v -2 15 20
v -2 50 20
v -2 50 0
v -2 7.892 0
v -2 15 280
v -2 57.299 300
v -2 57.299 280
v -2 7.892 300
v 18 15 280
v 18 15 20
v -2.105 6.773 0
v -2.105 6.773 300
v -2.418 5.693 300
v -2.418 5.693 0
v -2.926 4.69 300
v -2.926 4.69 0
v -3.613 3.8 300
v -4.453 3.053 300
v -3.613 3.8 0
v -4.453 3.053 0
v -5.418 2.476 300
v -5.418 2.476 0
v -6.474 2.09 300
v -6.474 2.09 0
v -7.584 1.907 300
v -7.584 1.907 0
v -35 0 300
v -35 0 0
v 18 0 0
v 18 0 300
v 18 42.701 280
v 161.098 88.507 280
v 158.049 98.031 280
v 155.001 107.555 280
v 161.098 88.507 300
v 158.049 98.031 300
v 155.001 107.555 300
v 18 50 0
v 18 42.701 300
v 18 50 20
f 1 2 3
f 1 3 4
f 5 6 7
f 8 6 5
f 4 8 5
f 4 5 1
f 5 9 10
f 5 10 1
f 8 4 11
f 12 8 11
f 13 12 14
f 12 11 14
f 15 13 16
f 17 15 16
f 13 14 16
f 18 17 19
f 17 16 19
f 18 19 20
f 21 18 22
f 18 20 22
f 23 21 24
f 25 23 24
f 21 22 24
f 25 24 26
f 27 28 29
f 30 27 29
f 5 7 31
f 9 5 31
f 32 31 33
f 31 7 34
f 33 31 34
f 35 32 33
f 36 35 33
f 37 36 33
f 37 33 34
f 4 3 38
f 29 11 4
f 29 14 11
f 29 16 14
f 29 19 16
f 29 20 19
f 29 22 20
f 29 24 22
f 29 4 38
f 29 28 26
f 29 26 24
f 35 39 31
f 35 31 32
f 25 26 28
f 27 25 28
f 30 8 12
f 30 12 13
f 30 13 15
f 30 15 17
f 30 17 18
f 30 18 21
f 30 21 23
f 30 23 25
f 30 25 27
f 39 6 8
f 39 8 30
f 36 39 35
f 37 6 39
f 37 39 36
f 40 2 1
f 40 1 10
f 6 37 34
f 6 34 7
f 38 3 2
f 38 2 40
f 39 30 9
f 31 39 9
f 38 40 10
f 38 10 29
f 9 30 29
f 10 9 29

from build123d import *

# Parameters (mm, degrees)
BOSS_EXTRU_2_DEPTH = 300
ESQUISSE7_W        = 20
ESQUISSE7_H        = 20
BOSS_EXTRU_5_DEPTH = 35
BOSS_EXTRU_6_DEPTH = 20


with BuildPart() as part:
    # Esquisse2 → Boss.-Extru.2 (new body)
    with BuildSketch(Plane.XY):
        Polygon((18, 15), (18, 0), (0, 0), (0, 5.028017638), (0, 15), align=None)
        with BuildLine():
            Line((-2, 15), (-2, 7.892441846))
            ThreePointArc((-2, 7.892441846), (-3.612637831, 3.799636794), (-7.583684398, 1.906902495))
            Line((-7.583684398, 1.906902495), (-35, 0))
            Line((-35, 0), (0, 0))
            Line((0, 0), (0, 5.028017638))
            Line((0, 5.028017638), (0, 15))
            Line((0, 15), (-2, 15))
        make_face()
    extrude(amount=BOSS_EXTRU_2_DEPTH)

    # Esquisse7 → Boss.-Extru.5 (add)
    with BuildSketch(Plane(origin=(0, 15, 0), x_dir=(1, 0, 0), z_dir=(0, 1, 0))):
        with Locations((8, -10)):
            Rectangle(ESQUISSE7_W, ESQUISSE7_H)
        with Locations((8, -290)):
            Rectangle(ESQUISSE7_W, ESQUISSE7_H)
    extrude(amount=BOSS_EXTRU_5_DEPTH)

    # Esquisse8 → Boss.-Extru.6 (add)
    with BuildSketch(Plane.XY.offset(300)):
        Polygon((158.049218198, 98.031133425), (155.000575208, 107.555091421), (-2, 57.298811074), (-2, 36.299138452), (161.097861189, 88.507175428), align=None)
    extrude(amount=-BOSS_EXTRU_6_DEPTH)


solid = part.part
